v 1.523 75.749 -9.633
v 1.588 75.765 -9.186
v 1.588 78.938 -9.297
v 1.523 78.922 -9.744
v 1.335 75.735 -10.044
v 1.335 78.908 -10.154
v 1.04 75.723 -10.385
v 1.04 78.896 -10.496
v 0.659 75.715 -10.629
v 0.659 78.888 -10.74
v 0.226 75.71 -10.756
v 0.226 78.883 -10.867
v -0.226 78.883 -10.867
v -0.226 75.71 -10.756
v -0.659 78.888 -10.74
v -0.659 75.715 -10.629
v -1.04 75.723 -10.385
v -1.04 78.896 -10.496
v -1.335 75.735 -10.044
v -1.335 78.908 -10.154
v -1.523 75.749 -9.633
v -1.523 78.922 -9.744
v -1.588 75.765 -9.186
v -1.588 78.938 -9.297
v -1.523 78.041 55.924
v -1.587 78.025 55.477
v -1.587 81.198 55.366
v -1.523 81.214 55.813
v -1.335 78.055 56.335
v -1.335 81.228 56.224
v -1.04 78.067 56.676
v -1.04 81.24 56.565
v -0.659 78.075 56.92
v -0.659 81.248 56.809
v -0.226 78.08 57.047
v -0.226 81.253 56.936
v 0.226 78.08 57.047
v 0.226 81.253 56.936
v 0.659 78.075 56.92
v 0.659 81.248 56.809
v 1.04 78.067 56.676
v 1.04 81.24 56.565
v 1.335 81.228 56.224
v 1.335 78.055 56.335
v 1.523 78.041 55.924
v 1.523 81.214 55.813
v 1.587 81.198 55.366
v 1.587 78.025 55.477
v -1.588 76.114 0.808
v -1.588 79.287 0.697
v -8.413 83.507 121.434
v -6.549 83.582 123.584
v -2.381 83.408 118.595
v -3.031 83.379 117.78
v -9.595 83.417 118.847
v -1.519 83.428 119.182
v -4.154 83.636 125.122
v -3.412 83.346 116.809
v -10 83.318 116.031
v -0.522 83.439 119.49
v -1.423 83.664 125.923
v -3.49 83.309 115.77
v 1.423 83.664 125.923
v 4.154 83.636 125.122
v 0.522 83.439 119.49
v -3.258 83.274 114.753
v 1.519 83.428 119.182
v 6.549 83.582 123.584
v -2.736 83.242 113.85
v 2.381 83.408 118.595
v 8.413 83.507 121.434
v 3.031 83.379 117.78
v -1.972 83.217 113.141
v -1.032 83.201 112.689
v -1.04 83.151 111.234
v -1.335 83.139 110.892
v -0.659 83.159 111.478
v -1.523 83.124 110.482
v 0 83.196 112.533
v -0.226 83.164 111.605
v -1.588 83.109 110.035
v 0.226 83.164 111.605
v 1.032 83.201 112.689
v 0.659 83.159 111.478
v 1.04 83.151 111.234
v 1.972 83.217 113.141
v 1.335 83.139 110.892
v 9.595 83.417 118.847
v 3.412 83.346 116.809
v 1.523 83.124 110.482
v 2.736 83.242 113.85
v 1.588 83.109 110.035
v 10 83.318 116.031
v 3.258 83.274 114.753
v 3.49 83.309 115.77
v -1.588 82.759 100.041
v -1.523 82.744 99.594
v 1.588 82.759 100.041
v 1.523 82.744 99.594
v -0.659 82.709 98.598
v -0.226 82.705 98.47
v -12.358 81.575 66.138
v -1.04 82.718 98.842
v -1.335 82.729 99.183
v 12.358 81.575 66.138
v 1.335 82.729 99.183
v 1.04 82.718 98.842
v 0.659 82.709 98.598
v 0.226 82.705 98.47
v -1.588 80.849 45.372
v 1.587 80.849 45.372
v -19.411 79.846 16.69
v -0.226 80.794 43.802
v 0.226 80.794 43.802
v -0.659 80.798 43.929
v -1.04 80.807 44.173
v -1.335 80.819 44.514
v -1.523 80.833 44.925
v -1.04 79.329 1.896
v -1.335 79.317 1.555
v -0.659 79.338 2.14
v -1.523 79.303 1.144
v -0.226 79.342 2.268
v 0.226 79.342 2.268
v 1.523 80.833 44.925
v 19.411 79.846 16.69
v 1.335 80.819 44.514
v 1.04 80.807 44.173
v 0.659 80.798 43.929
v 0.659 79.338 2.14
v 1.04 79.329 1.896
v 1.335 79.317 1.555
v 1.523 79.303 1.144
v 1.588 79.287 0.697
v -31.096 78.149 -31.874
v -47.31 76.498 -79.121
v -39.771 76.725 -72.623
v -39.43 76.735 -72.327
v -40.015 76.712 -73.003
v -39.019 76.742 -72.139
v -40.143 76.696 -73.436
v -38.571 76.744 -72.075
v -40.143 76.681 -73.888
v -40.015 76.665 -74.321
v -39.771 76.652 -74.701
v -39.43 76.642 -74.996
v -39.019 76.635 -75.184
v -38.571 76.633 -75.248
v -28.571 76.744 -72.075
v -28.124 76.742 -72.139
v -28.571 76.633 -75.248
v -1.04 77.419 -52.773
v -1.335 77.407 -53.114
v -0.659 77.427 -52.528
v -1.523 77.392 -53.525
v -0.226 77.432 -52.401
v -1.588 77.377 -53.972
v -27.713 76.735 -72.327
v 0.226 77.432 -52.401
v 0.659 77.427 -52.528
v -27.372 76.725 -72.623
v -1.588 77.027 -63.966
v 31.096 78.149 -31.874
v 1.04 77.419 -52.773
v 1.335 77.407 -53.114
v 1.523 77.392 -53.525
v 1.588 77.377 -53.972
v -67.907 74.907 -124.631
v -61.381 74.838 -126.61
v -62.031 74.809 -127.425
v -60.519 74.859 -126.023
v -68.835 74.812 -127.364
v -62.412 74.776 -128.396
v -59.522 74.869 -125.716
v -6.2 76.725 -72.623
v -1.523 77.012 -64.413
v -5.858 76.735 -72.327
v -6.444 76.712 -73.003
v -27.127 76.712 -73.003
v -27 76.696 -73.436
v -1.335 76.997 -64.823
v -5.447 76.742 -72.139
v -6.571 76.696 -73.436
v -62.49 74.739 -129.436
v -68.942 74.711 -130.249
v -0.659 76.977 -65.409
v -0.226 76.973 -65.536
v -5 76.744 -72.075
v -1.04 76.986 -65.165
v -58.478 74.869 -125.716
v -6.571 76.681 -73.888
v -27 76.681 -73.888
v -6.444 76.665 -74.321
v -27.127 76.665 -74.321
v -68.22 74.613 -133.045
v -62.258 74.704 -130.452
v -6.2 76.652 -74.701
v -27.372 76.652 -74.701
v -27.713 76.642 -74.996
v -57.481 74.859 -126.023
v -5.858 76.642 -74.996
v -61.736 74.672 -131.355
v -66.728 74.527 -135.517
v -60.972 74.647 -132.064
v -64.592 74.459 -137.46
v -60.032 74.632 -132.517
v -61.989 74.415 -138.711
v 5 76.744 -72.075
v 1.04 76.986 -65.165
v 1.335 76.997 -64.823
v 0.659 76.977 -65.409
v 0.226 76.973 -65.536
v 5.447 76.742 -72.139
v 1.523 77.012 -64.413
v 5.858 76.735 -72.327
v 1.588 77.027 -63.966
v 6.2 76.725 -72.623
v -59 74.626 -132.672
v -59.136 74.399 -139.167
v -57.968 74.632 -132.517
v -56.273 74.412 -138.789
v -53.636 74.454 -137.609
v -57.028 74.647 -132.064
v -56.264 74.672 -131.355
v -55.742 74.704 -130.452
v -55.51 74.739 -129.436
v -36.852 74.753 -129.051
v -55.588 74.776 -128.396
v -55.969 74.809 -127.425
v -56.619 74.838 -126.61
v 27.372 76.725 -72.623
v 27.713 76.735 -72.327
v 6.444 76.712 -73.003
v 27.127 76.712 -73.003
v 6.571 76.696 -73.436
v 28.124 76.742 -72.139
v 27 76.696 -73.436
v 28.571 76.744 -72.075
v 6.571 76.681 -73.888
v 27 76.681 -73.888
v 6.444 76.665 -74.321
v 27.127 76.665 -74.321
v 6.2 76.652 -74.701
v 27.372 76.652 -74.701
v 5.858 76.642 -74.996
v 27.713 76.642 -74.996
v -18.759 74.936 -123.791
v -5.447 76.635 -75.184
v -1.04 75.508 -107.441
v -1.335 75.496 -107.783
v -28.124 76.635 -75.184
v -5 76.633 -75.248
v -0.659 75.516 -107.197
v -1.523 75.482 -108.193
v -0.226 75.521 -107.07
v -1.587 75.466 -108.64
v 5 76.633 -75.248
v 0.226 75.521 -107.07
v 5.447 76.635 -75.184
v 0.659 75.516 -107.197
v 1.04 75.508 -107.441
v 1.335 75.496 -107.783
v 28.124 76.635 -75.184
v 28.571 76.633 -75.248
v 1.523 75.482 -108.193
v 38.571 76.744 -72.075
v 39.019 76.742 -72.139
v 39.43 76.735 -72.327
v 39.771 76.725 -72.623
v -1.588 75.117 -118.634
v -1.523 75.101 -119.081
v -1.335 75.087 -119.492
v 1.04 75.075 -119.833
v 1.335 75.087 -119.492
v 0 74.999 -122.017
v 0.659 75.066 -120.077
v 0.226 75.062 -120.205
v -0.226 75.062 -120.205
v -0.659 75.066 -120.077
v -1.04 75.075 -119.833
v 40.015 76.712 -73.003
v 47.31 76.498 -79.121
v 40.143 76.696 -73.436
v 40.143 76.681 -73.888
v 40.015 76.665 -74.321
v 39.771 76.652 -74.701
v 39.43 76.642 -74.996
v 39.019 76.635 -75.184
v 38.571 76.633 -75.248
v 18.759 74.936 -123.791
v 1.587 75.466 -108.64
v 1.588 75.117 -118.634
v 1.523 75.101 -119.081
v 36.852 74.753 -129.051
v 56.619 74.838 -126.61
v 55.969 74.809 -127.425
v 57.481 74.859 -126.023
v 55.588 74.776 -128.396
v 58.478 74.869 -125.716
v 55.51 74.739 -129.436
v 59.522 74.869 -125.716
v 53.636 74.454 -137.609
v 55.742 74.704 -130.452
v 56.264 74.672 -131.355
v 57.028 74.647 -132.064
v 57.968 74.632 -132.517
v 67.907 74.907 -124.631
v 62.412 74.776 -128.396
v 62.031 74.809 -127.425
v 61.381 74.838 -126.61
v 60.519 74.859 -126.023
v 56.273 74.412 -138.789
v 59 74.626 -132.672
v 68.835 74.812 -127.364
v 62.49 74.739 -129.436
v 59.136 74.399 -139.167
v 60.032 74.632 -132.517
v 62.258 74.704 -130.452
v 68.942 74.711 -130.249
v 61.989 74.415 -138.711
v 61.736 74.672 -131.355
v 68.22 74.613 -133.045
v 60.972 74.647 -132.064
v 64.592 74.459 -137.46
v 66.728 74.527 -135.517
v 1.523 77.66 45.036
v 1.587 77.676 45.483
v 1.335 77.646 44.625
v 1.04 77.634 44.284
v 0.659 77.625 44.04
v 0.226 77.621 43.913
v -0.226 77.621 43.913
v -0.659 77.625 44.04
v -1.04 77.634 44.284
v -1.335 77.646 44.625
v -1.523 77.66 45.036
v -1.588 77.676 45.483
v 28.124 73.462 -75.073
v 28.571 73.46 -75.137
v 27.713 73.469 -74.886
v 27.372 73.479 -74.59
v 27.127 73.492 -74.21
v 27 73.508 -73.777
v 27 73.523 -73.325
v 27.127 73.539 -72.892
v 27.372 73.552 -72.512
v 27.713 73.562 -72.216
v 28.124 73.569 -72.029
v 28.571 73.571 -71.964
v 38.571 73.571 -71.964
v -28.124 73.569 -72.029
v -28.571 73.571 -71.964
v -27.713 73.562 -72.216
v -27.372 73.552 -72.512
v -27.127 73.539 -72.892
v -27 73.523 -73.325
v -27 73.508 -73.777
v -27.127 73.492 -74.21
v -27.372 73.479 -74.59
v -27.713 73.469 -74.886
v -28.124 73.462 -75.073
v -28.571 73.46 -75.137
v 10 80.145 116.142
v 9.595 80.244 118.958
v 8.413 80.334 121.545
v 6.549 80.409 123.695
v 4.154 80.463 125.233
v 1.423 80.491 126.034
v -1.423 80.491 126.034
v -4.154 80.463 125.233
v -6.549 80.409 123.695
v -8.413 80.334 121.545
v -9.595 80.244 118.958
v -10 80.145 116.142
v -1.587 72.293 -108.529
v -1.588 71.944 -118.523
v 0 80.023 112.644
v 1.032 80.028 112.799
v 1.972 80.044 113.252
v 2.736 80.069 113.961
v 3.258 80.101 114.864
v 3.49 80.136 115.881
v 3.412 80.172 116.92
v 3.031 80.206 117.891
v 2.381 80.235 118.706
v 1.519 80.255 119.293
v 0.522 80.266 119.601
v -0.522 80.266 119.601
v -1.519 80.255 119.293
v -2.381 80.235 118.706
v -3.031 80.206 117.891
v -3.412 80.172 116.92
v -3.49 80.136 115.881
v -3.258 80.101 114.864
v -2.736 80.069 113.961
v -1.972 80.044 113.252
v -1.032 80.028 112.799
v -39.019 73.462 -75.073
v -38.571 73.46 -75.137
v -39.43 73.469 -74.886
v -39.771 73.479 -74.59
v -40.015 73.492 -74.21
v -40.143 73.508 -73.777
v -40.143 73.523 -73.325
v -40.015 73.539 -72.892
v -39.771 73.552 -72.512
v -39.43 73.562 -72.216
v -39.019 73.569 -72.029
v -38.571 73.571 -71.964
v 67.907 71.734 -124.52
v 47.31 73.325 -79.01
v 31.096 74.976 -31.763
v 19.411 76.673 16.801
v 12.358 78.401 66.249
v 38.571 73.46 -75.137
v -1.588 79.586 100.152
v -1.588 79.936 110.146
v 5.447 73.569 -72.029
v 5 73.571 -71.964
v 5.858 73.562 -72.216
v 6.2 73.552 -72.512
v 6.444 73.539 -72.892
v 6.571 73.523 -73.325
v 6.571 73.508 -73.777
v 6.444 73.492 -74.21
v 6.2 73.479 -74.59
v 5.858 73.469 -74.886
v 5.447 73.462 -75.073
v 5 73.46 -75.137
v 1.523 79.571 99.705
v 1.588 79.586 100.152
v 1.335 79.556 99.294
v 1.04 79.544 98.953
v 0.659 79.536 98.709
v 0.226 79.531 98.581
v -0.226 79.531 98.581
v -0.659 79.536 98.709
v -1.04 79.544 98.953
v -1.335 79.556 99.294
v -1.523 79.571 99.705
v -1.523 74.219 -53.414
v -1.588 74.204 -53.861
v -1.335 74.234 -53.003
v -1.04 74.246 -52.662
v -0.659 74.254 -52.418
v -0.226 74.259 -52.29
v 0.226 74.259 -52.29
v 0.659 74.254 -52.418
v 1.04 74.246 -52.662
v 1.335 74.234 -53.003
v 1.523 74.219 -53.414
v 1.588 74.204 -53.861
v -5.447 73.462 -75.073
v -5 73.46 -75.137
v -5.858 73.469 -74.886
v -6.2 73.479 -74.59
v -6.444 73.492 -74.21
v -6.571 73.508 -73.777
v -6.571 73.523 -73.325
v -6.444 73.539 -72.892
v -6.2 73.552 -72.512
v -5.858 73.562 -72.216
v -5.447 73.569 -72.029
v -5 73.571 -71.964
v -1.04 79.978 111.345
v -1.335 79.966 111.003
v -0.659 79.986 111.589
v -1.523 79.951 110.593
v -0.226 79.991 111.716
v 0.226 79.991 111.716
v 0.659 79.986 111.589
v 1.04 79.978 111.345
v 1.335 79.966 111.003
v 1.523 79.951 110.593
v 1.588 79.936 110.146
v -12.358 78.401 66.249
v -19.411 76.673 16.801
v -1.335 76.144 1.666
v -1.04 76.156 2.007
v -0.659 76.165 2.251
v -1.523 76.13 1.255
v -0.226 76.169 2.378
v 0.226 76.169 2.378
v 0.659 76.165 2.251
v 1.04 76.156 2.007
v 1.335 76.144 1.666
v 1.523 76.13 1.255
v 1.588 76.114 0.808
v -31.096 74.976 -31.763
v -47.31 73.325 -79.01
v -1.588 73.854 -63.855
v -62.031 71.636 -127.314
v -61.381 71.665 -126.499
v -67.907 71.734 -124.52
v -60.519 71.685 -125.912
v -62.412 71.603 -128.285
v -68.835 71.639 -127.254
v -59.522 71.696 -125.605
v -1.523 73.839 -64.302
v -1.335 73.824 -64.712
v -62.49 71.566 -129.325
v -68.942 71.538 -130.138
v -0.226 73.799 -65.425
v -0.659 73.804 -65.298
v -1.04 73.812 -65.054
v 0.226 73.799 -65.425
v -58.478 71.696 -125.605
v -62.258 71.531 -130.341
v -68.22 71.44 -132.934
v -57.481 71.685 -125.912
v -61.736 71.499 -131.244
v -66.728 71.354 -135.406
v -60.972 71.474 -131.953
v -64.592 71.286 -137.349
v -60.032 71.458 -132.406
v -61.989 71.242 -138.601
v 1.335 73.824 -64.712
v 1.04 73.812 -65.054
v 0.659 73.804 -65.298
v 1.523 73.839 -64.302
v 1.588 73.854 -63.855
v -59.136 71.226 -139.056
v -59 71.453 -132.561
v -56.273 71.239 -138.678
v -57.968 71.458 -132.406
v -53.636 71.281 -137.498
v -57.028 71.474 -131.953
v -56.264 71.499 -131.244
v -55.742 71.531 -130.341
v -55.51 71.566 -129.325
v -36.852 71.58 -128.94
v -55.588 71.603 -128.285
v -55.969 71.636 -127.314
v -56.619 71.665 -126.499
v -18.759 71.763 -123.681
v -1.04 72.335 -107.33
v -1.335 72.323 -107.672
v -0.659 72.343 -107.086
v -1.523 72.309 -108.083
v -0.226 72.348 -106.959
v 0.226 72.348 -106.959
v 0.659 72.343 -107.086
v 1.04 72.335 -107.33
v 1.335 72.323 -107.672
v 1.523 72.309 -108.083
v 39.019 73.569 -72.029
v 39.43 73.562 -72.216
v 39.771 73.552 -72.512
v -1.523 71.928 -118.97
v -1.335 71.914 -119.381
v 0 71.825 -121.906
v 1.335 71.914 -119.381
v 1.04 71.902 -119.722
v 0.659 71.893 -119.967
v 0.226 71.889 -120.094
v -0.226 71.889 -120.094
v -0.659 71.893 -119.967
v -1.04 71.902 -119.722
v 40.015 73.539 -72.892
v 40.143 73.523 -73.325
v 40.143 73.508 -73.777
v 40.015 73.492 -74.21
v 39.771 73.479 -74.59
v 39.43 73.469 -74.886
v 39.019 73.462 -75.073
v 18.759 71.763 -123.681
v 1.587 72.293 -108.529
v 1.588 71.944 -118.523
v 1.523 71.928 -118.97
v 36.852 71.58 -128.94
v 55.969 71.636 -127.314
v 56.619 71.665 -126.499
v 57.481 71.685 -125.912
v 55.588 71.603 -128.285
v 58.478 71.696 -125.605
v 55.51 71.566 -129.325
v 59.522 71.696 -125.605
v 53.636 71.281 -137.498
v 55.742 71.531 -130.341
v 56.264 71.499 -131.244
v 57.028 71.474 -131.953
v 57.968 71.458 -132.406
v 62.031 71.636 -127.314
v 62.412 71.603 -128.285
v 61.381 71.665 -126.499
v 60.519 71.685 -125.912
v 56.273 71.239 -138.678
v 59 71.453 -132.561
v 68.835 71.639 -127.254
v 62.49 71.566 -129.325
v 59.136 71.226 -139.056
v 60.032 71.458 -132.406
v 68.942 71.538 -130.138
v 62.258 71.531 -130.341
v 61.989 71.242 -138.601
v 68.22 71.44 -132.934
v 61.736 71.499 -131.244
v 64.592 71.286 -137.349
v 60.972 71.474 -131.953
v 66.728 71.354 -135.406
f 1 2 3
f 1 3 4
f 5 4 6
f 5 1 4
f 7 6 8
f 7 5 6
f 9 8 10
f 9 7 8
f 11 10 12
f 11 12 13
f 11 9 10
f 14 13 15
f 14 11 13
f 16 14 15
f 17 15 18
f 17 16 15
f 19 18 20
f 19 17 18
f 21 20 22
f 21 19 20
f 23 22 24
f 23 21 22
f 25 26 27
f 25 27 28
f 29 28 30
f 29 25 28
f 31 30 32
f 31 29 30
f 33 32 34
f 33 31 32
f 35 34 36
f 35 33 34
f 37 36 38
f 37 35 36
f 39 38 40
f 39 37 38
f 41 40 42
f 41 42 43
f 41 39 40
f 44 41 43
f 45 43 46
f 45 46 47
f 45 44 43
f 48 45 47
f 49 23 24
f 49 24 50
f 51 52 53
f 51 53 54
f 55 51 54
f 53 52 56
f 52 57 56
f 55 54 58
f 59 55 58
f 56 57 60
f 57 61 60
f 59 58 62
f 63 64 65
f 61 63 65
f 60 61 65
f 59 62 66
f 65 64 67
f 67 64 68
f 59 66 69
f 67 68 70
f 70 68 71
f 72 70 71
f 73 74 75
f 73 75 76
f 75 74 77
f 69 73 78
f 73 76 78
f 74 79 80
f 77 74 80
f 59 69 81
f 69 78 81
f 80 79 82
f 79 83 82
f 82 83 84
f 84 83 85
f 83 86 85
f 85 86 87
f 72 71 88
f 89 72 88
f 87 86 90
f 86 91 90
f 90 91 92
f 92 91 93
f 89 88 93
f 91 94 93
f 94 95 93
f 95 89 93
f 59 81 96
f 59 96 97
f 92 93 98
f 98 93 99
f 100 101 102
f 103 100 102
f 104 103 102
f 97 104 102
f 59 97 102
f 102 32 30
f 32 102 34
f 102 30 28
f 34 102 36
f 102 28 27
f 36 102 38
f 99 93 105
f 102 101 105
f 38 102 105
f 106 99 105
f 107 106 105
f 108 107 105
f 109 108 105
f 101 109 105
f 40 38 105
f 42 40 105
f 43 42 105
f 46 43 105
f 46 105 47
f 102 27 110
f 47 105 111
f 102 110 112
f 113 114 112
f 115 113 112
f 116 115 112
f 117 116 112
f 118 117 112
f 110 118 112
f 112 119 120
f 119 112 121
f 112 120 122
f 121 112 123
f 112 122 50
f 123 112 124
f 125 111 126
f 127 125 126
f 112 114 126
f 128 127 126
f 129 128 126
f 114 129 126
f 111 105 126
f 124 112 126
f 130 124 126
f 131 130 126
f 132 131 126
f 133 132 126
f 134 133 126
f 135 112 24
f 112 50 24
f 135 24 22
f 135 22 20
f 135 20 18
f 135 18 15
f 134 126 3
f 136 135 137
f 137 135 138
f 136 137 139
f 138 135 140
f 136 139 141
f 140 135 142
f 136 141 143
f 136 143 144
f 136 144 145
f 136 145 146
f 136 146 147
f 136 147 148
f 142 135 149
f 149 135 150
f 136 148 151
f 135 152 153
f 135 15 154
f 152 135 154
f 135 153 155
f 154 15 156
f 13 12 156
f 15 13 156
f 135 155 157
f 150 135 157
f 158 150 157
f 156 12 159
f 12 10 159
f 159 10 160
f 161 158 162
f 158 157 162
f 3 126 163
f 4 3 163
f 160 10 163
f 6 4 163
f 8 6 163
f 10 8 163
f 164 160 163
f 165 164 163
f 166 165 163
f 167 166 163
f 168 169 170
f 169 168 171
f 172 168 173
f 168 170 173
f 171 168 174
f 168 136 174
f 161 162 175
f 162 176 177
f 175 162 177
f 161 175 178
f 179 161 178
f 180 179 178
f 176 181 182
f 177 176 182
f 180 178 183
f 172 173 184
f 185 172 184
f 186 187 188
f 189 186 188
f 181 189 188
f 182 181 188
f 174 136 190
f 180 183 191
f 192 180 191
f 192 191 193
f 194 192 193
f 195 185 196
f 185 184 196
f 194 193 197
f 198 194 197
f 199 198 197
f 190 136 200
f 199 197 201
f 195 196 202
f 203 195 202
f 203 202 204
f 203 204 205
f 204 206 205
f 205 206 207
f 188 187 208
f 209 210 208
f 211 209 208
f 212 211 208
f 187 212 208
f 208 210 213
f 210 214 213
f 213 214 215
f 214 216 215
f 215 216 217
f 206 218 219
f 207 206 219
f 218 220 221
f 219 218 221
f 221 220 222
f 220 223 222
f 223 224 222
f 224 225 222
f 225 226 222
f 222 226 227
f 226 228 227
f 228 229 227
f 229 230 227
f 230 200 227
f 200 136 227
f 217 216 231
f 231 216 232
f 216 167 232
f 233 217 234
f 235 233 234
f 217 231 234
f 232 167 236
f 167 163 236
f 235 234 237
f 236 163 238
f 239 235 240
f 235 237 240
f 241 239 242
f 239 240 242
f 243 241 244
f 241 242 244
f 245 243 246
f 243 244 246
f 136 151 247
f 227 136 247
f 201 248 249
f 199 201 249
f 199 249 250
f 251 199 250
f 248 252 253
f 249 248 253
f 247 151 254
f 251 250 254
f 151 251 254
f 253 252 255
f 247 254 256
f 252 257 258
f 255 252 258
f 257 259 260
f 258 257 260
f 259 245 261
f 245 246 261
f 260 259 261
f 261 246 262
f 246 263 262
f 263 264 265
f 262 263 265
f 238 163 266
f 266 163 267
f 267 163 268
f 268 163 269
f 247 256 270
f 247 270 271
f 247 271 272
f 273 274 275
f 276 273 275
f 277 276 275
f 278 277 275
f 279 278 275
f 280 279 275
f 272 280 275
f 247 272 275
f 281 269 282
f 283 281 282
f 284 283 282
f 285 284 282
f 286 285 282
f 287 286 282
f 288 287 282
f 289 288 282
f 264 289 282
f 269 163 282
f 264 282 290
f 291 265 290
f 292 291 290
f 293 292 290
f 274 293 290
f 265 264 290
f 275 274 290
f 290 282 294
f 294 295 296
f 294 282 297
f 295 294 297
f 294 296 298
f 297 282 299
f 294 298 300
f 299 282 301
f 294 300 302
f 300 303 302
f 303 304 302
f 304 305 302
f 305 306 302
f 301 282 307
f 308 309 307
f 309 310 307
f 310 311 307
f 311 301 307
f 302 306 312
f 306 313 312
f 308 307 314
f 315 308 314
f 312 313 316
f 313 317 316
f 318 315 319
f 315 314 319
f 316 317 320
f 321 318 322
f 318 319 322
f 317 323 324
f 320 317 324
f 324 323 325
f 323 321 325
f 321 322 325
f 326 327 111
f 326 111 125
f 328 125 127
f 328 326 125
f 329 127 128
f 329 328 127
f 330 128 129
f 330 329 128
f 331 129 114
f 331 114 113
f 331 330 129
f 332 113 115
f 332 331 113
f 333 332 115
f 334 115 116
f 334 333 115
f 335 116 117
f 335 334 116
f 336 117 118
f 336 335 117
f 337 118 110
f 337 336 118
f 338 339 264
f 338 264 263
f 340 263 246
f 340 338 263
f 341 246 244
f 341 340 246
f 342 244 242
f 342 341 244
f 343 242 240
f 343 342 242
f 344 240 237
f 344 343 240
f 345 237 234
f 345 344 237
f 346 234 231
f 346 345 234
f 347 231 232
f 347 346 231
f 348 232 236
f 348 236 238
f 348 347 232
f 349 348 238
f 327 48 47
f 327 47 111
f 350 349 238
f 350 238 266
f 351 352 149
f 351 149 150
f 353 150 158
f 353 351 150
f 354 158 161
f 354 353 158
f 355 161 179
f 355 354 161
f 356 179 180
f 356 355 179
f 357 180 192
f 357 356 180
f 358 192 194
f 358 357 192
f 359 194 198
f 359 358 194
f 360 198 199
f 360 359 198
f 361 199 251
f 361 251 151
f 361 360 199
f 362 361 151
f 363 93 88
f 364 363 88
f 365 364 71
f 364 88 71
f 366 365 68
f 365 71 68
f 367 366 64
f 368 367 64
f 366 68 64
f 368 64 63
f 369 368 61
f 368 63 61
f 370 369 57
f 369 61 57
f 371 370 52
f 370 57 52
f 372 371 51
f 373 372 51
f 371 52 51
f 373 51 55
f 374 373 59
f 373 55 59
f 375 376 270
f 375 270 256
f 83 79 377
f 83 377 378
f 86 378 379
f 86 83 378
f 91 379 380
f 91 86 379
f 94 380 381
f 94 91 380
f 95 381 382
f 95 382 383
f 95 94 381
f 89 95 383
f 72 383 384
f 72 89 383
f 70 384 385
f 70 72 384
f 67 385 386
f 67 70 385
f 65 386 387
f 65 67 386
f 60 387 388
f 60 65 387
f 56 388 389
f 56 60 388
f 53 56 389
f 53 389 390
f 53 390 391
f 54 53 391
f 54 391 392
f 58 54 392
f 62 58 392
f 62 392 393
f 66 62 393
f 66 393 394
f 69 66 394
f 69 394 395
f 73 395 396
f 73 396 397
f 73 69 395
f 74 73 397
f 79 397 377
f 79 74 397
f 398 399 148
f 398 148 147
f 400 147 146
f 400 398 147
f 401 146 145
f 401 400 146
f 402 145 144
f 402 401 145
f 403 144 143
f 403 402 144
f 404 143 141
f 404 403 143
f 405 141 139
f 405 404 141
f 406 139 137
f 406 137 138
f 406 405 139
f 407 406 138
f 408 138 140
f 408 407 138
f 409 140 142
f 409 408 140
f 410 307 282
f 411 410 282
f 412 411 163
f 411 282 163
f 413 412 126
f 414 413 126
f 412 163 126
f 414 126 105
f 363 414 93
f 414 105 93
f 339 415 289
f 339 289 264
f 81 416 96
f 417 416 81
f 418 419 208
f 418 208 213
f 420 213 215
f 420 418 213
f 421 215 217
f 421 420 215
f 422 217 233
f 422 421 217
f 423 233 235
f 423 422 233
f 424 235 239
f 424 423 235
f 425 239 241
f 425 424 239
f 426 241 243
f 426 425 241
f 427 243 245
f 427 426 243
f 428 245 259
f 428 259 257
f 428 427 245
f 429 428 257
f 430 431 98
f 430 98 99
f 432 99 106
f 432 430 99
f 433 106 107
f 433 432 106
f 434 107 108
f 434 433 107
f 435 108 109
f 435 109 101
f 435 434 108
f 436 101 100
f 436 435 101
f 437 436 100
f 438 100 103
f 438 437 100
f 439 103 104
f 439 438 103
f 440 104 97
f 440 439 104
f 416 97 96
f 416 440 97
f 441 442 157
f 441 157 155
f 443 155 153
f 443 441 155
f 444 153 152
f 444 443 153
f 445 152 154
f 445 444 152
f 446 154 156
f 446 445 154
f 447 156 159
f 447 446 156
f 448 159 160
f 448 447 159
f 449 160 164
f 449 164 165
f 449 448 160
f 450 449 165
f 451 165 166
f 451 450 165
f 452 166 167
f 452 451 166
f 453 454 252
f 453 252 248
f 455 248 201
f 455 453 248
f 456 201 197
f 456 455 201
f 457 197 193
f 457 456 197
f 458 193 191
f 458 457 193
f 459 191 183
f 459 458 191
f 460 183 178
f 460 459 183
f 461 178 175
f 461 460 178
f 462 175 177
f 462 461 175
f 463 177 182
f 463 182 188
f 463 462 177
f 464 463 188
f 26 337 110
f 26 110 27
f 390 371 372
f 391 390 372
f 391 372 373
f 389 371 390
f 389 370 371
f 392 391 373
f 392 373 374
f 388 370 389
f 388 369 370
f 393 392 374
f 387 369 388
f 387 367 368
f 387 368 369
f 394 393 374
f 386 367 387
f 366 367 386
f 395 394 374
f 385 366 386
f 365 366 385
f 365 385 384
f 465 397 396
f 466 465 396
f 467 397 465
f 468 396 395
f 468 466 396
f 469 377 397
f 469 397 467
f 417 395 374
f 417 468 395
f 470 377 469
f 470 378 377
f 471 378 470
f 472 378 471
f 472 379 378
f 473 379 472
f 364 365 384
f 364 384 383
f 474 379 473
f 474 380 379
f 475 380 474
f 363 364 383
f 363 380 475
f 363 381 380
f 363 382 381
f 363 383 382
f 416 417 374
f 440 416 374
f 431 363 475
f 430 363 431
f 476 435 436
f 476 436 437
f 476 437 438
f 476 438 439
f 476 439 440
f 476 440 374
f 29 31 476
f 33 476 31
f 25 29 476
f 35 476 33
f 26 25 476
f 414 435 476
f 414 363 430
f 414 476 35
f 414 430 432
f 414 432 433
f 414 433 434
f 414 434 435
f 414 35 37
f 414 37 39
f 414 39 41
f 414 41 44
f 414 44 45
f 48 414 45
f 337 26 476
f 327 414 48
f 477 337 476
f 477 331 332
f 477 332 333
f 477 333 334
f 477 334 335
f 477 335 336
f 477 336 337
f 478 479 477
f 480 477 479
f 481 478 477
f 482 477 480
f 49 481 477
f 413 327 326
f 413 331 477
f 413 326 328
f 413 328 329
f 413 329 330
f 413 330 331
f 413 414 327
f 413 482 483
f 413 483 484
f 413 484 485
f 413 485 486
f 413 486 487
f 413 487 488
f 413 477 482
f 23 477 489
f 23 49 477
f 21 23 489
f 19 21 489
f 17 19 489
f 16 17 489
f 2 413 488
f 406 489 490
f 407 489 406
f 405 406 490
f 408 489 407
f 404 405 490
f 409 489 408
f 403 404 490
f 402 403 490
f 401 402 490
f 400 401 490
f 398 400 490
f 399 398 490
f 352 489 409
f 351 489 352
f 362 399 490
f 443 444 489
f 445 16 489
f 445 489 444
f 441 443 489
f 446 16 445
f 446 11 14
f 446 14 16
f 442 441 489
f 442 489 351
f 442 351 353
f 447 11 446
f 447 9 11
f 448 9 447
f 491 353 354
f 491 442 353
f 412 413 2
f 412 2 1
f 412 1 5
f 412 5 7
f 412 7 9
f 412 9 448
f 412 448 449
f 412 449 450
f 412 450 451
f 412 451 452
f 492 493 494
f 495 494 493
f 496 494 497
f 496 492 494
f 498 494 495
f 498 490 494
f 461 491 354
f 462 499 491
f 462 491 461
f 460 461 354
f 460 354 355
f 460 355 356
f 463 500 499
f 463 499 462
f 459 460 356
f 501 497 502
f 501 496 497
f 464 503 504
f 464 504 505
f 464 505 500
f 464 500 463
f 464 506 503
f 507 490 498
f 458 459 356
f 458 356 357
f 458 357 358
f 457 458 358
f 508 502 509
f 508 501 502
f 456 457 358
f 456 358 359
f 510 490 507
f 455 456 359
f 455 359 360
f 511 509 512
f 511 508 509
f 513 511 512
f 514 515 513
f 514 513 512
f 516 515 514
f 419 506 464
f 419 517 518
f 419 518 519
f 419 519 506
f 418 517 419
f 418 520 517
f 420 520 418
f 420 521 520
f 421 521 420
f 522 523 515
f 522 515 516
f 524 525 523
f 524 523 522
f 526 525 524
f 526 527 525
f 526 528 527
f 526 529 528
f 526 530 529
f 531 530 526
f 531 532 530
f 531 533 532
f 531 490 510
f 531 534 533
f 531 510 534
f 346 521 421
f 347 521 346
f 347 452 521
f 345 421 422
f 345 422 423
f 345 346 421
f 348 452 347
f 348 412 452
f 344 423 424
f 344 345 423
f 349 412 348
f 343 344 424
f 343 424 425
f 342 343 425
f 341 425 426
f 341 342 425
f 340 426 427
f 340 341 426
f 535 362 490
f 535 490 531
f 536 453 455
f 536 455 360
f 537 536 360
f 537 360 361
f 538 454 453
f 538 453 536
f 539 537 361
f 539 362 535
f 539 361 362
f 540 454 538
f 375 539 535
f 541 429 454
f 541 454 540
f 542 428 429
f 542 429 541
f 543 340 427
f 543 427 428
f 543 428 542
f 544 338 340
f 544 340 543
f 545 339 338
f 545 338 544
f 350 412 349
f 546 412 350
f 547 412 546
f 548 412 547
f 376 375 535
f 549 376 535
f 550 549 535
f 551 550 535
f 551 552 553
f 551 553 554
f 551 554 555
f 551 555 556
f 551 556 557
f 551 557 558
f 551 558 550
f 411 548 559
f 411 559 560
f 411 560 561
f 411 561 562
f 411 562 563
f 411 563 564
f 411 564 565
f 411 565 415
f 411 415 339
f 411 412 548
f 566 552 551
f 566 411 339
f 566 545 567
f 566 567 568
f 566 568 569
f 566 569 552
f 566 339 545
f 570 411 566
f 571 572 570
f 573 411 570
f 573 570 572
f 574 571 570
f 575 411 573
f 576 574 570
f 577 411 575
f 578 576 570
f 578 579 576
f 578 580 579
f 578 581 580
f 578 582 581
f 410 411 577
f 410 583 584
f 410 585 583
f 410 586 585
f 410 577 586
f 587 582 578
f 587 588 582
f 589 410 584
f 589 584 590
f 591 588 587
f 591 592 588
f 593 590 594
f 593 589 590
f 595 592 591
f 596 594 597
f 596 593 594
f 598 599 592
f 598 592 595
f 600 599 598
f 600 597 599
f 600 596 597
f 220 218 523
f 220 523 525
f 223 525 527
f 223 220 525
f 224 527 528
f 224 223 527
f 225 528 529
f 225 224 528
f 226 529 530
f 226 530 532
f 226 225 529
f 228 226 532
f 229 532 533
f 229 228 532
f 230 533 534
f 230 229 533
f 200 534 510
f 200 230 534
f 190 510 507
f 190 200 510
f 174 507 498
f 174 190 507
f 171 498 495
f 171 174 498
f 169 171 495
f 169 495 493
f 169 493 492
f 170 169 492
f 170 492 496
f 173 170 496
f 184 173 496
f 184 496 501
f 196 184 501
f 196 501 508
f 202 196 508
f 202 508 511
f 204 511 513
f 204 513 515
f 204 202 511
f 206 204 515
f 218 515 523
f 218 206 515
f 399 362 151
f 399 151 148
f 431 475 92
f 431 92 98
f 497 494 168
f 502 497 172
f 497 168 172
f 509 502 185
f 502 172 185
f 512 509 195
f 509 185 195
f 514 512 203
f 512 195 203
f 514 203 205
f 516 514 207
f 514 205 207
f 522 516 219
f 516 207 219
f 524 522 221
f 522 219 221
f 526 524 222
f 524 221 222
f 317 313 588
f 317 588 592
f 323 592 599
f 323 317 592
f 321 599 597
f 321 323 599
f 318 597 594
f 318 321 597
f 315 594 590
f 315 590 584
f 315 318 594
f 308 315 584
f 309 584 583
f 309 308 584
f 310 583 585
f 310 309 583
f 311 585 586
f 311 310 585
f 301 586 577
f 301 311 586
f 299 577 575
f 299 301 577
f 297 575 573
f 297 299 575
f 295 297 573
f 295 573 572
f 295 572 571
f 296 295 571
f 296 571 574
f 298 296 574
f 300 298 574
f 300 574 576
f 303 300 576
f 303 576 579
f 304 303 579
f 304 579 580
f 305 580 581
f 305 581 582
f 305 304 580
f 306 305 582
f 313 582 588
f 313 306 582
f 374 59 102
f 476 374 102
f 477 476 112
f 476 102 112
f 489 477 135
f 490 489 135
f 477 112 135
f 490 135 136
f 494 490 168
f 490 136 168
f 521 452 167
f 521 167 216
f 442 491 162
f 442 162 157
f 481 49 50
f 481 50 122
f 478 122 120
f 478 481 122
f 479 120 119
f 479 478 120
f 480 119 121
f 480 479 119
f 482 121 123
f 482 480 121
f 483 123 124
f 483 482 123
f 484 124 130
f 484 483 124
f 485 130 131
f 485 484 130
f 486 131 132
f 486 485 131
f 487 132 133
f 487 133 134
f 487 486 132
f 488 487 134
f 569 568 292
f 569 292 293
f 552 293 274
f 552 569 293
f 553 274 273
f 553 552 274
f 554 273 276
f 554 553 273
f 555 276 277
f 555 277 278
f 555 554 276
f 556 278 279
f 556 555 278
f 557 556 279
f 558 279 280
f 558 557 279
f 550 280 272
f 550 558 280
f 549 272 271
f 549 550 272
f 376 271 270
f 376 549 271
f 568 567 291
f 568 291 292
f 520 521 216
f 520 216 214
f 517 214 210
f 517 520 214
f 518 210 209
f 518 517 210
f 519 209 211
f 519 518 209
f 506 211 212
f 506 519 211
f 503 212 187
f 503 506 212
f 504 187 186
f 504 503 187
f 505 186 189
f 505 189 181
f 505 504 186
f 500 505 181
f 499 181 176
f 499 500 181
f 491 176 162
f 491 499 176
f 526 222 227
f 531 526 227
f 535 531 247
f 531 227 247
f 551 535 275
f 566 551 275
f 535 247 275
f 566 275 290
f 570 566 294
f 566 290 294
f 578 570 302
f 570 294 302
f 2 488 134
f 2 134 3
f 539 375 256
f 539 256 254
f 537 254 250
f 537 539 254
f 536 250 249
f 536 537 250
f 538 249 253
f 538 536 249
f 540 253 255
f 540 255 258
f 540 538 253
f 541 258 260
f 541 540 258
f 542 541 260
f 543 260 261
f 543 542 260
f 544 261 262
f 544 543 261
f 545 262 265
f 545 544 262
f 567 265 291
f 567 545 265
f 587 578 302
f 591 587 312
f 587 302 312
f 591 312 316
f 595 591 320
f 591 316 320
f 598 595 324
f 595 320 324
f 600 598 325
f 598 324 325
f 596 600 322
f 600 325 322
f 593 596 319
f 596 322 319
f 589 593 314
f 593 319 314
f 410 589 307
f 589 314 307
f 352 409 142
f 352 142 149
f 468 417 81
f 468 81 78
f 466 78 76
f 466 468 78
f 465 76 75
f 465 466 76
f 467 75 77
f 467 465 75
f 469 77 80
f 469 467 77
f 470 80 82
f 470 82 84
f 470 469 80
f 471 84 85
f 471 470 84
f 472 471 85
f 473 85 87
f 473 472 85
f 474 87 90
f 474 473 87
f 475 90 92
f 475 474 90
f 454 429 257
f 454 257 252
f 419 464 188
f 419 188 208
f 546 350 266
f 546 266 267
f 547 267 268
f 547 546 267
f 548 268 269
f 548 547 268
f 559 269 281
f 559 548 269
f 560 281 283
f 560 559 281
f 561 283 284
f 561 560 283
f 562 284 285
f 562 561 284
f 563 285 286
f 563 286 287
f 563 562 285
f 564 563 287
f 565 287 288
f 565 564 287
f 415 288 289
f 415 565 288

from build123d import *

# Parameters (mm, degrees)
SKETCH1_R           = 10
SKETCH1_R_2         = 3.499999985
SKETCH1_R_3         = 3.5
BOSS_EXTRUDE1_DEPTH = 3.175
CUT_EXTRUDE1_DEPTH  = 3.175


with BuildPart() as part:
    # Sketch1 → Boss-Extrude1 (new body)
    # profile 1 of 4: a face of its own
    with BuildSketch(Plane(origin=(0, 79.166310833, -2.766864901), x_dir=(0, -0.03492870325036397, -0.9993898066766781), z_dir=(0, -0.9993898066766781, 0.03492870325036397))):
        with BuildLine():
            ThreePointArc((-118.870418158, 10), (-111.799350346, 7.071067812), (-108.870418158, 0))
            ThreePointArc((-108.870418158, 0), (-111.799350346, -7.071067812), (-118.870418158, -10))
            ThreePointArc((-118.870418158, -10), (4.966133868, -24.680117915), (121.938173717, -67.906722838))
            ThreePointArc((121.938173717, -67.906722838), (119.088657305, -52.269505992), (134.924502551, -53.636363636))
            ThreePointArc((134.924502551, -53.636363636), (119.323202161, 0), (134.924502551, 53.636363636))
            ThreePointArc((134.924502551, 53.636363636), (119.088657305, 52.269505992), (121.938173717, 67.906722838))
            ThreePointArc((121.938173717, 67.906722838), (4.966133868, 24.680117915), (-118.870418158, 10))
        make_face()
    # profile 2 of 4: a face of its own
    with BuildSketch(Plane(origin=(0, 79.166310833, -2.766864901), x_dir=(0, -0.03492870325036397, -0.9993898066766781), z_dir=(0, -0.9993898066766781, 0.03492870325036397))):
        with Locations((-118.870418158, 0)):
            Circle(SKETCH1_R)
        with Locations((-118.870418158, 0)):
            Circle(SKETCH1_R_2, mode=Mode.SUBTRACT)
    # profile 3 of 4: a face of its own
    with BuildSketch(Plane(origin=(0, 79.166310833, -2.766864901), x_dir=(0, -0.03492870325036397, -0.9993898066766781), z_dir=(0, -0.9993898066766781, 0.03492870325036397))):
        with Locations((126.48463259, 59)):
            Circle(SKETCH1_R)
        with Locations((126.48463259, 59)):
            Circle(SKETCH1_R_3, mode=Mode.SUBTRACT)
    # profile 4 of 4: a face of its own
    with BuildSketch(Plane(origin=(0, 79.166310833, -2.766864901), x_dir=(0, -0.03492870325036397, -0.9993898066766781), z_dir=(0, -0.9993898066766781, 0.03492870325036397))):
        with Locations((126.48463259, -59)):
            Circle(SKETCH1_R)
        with Locations((126.48463259, -59)):
            Circle(SKETCH1_R_3, mode=Mode.SUBTRACT)
    extrude(amount=BOSS_EXTRUDE1_DEPTH)

    # Sketch2 → Cut-Extrude1 (cut)
    with BuildSketch(Plane(origin=(0, 75.993248196, -2.655966268), x_dir=(1, 0, 0), z_dir=(0, -0.9993898066766781, 0.034928703250363964))):
        with BuildLine():
            Line((1.5875, 112.870418158), (1.5875, 102.870418158))
            ThreePointArc((1.5875, 102.870418158), (0, 101.282918158), (-1.5875, 102.870418158))
            Line((-1.5875, 102.870418158), (-1.5875, 112.870418158))
            ThreePointArc((-1.5875, 112.870418158), (0, 114.457918158), (1.5875, 112.870418158))
        make_face()
        with BuildLine():
            Line((1.5875, -105.938173717), (1.5875, -115.938173717))
            ThreePointArc((1.5875, -115.938173717), (0, -117.525673717), (-1.5875, -115.938173717))
            Line((-1.5875, -115.938173717), (-1.5875, -105.938173717))
            ThreePointArc((-1.5875, -105.938173717), (0, -104.350673717), (1.5875, -105.938173717))
        make_face()
        with BuildLine():
            Line((1.5875, 58.168270189), (1.5875, 48.168270189))
            ThreePointArc((1.5875, 48.168270189), (0, 46.580770189), (-1.5875, 48.168270189))
            Line((-1.5875, 48.168270189), (-1.5875, 58.168270189))
            ThreePointArc((-1.5875, 58.168270189), (0, 59.755770189), (1.5875, 58.168270189))
        make_face()
        with BuildLine():
            Line((1.5875, 3.46612222), (1.5875, -6.53387778))
            ThreePointArc((1.5875, -6.53387778), (0, -8.12137778), (-1.5875, -6.53387778))
            Line((-1.5875, -6.53387778), (-1.5875, 3.46612222))
            ThreePointArc((-1.5875, 3.46612222), (0, 5.05362222), (1.5875, 3.46612222))
        make_face()
        with BuildLine():
            Line((1.5875, -51.236025749), (1.5875, -61.236025749))
            ThreePointArc((1.5875, -61.236025749), (0, -62.823525749), (-1.5875, -61.236025749))
            Line((-1.5875, -61.236025749), (-1.5875, -51.236025749))
            ThreePointArc((-1.5875, -51.236025749), (0, -49.648525749), (1.5875, -51.236025749))
        make_face()
        with BuildLine():
            Line((38.57145678, -72.525673717), (28.57145678, -72.525673717))
            ThreePointArc((28.57145678, -72.525673717), (26.98395678, -70.938173717), (28.57145678, -69.350673717))
            Line((28.57145678, -69.350673717), (38.57145678, -69.350673717))
            ThreePointArc((38.57145678, -69.350673717), (40.15895678, -70.938173717), (38.57145678, -72.525673717))
        make_face()
        with BuildLine():
            Line((5, -72.525673717), (-5, -72.525673717))
            ThreePointArc((-5, -72.525673717), (-6.5875, -70.938173717), (-5, -69.350673717))
            Line((-5, -69.350673717), (5, -69.350673717))
            ThreePointArc((5, -69.350673717), (6.5875, -70.938173717), (5, -72.525673717))
        make_face()
        with BuildLine():
            Line((-28.57145678, -72.525673717), (-38.57145678, -72.525673717))
            ThreePointArc((-38.57145678, -72.525673717), (-40.15895678, -70.938173717), (-38.57145678, -69.350673717))
            Line((-38.57145678, -69.350673717), (-28.57145678, -69.350673717))
            ThreePointArc((-28.57145678, -69.350673717), (-26.98395678, -70.938173717), (-28.57145678, -72.525673717))
        make_face()
    extrude(amount=-CUT_EXTRUDE1_DEPTH, mode=Mode.SUBTRACT)


solid = part.part
